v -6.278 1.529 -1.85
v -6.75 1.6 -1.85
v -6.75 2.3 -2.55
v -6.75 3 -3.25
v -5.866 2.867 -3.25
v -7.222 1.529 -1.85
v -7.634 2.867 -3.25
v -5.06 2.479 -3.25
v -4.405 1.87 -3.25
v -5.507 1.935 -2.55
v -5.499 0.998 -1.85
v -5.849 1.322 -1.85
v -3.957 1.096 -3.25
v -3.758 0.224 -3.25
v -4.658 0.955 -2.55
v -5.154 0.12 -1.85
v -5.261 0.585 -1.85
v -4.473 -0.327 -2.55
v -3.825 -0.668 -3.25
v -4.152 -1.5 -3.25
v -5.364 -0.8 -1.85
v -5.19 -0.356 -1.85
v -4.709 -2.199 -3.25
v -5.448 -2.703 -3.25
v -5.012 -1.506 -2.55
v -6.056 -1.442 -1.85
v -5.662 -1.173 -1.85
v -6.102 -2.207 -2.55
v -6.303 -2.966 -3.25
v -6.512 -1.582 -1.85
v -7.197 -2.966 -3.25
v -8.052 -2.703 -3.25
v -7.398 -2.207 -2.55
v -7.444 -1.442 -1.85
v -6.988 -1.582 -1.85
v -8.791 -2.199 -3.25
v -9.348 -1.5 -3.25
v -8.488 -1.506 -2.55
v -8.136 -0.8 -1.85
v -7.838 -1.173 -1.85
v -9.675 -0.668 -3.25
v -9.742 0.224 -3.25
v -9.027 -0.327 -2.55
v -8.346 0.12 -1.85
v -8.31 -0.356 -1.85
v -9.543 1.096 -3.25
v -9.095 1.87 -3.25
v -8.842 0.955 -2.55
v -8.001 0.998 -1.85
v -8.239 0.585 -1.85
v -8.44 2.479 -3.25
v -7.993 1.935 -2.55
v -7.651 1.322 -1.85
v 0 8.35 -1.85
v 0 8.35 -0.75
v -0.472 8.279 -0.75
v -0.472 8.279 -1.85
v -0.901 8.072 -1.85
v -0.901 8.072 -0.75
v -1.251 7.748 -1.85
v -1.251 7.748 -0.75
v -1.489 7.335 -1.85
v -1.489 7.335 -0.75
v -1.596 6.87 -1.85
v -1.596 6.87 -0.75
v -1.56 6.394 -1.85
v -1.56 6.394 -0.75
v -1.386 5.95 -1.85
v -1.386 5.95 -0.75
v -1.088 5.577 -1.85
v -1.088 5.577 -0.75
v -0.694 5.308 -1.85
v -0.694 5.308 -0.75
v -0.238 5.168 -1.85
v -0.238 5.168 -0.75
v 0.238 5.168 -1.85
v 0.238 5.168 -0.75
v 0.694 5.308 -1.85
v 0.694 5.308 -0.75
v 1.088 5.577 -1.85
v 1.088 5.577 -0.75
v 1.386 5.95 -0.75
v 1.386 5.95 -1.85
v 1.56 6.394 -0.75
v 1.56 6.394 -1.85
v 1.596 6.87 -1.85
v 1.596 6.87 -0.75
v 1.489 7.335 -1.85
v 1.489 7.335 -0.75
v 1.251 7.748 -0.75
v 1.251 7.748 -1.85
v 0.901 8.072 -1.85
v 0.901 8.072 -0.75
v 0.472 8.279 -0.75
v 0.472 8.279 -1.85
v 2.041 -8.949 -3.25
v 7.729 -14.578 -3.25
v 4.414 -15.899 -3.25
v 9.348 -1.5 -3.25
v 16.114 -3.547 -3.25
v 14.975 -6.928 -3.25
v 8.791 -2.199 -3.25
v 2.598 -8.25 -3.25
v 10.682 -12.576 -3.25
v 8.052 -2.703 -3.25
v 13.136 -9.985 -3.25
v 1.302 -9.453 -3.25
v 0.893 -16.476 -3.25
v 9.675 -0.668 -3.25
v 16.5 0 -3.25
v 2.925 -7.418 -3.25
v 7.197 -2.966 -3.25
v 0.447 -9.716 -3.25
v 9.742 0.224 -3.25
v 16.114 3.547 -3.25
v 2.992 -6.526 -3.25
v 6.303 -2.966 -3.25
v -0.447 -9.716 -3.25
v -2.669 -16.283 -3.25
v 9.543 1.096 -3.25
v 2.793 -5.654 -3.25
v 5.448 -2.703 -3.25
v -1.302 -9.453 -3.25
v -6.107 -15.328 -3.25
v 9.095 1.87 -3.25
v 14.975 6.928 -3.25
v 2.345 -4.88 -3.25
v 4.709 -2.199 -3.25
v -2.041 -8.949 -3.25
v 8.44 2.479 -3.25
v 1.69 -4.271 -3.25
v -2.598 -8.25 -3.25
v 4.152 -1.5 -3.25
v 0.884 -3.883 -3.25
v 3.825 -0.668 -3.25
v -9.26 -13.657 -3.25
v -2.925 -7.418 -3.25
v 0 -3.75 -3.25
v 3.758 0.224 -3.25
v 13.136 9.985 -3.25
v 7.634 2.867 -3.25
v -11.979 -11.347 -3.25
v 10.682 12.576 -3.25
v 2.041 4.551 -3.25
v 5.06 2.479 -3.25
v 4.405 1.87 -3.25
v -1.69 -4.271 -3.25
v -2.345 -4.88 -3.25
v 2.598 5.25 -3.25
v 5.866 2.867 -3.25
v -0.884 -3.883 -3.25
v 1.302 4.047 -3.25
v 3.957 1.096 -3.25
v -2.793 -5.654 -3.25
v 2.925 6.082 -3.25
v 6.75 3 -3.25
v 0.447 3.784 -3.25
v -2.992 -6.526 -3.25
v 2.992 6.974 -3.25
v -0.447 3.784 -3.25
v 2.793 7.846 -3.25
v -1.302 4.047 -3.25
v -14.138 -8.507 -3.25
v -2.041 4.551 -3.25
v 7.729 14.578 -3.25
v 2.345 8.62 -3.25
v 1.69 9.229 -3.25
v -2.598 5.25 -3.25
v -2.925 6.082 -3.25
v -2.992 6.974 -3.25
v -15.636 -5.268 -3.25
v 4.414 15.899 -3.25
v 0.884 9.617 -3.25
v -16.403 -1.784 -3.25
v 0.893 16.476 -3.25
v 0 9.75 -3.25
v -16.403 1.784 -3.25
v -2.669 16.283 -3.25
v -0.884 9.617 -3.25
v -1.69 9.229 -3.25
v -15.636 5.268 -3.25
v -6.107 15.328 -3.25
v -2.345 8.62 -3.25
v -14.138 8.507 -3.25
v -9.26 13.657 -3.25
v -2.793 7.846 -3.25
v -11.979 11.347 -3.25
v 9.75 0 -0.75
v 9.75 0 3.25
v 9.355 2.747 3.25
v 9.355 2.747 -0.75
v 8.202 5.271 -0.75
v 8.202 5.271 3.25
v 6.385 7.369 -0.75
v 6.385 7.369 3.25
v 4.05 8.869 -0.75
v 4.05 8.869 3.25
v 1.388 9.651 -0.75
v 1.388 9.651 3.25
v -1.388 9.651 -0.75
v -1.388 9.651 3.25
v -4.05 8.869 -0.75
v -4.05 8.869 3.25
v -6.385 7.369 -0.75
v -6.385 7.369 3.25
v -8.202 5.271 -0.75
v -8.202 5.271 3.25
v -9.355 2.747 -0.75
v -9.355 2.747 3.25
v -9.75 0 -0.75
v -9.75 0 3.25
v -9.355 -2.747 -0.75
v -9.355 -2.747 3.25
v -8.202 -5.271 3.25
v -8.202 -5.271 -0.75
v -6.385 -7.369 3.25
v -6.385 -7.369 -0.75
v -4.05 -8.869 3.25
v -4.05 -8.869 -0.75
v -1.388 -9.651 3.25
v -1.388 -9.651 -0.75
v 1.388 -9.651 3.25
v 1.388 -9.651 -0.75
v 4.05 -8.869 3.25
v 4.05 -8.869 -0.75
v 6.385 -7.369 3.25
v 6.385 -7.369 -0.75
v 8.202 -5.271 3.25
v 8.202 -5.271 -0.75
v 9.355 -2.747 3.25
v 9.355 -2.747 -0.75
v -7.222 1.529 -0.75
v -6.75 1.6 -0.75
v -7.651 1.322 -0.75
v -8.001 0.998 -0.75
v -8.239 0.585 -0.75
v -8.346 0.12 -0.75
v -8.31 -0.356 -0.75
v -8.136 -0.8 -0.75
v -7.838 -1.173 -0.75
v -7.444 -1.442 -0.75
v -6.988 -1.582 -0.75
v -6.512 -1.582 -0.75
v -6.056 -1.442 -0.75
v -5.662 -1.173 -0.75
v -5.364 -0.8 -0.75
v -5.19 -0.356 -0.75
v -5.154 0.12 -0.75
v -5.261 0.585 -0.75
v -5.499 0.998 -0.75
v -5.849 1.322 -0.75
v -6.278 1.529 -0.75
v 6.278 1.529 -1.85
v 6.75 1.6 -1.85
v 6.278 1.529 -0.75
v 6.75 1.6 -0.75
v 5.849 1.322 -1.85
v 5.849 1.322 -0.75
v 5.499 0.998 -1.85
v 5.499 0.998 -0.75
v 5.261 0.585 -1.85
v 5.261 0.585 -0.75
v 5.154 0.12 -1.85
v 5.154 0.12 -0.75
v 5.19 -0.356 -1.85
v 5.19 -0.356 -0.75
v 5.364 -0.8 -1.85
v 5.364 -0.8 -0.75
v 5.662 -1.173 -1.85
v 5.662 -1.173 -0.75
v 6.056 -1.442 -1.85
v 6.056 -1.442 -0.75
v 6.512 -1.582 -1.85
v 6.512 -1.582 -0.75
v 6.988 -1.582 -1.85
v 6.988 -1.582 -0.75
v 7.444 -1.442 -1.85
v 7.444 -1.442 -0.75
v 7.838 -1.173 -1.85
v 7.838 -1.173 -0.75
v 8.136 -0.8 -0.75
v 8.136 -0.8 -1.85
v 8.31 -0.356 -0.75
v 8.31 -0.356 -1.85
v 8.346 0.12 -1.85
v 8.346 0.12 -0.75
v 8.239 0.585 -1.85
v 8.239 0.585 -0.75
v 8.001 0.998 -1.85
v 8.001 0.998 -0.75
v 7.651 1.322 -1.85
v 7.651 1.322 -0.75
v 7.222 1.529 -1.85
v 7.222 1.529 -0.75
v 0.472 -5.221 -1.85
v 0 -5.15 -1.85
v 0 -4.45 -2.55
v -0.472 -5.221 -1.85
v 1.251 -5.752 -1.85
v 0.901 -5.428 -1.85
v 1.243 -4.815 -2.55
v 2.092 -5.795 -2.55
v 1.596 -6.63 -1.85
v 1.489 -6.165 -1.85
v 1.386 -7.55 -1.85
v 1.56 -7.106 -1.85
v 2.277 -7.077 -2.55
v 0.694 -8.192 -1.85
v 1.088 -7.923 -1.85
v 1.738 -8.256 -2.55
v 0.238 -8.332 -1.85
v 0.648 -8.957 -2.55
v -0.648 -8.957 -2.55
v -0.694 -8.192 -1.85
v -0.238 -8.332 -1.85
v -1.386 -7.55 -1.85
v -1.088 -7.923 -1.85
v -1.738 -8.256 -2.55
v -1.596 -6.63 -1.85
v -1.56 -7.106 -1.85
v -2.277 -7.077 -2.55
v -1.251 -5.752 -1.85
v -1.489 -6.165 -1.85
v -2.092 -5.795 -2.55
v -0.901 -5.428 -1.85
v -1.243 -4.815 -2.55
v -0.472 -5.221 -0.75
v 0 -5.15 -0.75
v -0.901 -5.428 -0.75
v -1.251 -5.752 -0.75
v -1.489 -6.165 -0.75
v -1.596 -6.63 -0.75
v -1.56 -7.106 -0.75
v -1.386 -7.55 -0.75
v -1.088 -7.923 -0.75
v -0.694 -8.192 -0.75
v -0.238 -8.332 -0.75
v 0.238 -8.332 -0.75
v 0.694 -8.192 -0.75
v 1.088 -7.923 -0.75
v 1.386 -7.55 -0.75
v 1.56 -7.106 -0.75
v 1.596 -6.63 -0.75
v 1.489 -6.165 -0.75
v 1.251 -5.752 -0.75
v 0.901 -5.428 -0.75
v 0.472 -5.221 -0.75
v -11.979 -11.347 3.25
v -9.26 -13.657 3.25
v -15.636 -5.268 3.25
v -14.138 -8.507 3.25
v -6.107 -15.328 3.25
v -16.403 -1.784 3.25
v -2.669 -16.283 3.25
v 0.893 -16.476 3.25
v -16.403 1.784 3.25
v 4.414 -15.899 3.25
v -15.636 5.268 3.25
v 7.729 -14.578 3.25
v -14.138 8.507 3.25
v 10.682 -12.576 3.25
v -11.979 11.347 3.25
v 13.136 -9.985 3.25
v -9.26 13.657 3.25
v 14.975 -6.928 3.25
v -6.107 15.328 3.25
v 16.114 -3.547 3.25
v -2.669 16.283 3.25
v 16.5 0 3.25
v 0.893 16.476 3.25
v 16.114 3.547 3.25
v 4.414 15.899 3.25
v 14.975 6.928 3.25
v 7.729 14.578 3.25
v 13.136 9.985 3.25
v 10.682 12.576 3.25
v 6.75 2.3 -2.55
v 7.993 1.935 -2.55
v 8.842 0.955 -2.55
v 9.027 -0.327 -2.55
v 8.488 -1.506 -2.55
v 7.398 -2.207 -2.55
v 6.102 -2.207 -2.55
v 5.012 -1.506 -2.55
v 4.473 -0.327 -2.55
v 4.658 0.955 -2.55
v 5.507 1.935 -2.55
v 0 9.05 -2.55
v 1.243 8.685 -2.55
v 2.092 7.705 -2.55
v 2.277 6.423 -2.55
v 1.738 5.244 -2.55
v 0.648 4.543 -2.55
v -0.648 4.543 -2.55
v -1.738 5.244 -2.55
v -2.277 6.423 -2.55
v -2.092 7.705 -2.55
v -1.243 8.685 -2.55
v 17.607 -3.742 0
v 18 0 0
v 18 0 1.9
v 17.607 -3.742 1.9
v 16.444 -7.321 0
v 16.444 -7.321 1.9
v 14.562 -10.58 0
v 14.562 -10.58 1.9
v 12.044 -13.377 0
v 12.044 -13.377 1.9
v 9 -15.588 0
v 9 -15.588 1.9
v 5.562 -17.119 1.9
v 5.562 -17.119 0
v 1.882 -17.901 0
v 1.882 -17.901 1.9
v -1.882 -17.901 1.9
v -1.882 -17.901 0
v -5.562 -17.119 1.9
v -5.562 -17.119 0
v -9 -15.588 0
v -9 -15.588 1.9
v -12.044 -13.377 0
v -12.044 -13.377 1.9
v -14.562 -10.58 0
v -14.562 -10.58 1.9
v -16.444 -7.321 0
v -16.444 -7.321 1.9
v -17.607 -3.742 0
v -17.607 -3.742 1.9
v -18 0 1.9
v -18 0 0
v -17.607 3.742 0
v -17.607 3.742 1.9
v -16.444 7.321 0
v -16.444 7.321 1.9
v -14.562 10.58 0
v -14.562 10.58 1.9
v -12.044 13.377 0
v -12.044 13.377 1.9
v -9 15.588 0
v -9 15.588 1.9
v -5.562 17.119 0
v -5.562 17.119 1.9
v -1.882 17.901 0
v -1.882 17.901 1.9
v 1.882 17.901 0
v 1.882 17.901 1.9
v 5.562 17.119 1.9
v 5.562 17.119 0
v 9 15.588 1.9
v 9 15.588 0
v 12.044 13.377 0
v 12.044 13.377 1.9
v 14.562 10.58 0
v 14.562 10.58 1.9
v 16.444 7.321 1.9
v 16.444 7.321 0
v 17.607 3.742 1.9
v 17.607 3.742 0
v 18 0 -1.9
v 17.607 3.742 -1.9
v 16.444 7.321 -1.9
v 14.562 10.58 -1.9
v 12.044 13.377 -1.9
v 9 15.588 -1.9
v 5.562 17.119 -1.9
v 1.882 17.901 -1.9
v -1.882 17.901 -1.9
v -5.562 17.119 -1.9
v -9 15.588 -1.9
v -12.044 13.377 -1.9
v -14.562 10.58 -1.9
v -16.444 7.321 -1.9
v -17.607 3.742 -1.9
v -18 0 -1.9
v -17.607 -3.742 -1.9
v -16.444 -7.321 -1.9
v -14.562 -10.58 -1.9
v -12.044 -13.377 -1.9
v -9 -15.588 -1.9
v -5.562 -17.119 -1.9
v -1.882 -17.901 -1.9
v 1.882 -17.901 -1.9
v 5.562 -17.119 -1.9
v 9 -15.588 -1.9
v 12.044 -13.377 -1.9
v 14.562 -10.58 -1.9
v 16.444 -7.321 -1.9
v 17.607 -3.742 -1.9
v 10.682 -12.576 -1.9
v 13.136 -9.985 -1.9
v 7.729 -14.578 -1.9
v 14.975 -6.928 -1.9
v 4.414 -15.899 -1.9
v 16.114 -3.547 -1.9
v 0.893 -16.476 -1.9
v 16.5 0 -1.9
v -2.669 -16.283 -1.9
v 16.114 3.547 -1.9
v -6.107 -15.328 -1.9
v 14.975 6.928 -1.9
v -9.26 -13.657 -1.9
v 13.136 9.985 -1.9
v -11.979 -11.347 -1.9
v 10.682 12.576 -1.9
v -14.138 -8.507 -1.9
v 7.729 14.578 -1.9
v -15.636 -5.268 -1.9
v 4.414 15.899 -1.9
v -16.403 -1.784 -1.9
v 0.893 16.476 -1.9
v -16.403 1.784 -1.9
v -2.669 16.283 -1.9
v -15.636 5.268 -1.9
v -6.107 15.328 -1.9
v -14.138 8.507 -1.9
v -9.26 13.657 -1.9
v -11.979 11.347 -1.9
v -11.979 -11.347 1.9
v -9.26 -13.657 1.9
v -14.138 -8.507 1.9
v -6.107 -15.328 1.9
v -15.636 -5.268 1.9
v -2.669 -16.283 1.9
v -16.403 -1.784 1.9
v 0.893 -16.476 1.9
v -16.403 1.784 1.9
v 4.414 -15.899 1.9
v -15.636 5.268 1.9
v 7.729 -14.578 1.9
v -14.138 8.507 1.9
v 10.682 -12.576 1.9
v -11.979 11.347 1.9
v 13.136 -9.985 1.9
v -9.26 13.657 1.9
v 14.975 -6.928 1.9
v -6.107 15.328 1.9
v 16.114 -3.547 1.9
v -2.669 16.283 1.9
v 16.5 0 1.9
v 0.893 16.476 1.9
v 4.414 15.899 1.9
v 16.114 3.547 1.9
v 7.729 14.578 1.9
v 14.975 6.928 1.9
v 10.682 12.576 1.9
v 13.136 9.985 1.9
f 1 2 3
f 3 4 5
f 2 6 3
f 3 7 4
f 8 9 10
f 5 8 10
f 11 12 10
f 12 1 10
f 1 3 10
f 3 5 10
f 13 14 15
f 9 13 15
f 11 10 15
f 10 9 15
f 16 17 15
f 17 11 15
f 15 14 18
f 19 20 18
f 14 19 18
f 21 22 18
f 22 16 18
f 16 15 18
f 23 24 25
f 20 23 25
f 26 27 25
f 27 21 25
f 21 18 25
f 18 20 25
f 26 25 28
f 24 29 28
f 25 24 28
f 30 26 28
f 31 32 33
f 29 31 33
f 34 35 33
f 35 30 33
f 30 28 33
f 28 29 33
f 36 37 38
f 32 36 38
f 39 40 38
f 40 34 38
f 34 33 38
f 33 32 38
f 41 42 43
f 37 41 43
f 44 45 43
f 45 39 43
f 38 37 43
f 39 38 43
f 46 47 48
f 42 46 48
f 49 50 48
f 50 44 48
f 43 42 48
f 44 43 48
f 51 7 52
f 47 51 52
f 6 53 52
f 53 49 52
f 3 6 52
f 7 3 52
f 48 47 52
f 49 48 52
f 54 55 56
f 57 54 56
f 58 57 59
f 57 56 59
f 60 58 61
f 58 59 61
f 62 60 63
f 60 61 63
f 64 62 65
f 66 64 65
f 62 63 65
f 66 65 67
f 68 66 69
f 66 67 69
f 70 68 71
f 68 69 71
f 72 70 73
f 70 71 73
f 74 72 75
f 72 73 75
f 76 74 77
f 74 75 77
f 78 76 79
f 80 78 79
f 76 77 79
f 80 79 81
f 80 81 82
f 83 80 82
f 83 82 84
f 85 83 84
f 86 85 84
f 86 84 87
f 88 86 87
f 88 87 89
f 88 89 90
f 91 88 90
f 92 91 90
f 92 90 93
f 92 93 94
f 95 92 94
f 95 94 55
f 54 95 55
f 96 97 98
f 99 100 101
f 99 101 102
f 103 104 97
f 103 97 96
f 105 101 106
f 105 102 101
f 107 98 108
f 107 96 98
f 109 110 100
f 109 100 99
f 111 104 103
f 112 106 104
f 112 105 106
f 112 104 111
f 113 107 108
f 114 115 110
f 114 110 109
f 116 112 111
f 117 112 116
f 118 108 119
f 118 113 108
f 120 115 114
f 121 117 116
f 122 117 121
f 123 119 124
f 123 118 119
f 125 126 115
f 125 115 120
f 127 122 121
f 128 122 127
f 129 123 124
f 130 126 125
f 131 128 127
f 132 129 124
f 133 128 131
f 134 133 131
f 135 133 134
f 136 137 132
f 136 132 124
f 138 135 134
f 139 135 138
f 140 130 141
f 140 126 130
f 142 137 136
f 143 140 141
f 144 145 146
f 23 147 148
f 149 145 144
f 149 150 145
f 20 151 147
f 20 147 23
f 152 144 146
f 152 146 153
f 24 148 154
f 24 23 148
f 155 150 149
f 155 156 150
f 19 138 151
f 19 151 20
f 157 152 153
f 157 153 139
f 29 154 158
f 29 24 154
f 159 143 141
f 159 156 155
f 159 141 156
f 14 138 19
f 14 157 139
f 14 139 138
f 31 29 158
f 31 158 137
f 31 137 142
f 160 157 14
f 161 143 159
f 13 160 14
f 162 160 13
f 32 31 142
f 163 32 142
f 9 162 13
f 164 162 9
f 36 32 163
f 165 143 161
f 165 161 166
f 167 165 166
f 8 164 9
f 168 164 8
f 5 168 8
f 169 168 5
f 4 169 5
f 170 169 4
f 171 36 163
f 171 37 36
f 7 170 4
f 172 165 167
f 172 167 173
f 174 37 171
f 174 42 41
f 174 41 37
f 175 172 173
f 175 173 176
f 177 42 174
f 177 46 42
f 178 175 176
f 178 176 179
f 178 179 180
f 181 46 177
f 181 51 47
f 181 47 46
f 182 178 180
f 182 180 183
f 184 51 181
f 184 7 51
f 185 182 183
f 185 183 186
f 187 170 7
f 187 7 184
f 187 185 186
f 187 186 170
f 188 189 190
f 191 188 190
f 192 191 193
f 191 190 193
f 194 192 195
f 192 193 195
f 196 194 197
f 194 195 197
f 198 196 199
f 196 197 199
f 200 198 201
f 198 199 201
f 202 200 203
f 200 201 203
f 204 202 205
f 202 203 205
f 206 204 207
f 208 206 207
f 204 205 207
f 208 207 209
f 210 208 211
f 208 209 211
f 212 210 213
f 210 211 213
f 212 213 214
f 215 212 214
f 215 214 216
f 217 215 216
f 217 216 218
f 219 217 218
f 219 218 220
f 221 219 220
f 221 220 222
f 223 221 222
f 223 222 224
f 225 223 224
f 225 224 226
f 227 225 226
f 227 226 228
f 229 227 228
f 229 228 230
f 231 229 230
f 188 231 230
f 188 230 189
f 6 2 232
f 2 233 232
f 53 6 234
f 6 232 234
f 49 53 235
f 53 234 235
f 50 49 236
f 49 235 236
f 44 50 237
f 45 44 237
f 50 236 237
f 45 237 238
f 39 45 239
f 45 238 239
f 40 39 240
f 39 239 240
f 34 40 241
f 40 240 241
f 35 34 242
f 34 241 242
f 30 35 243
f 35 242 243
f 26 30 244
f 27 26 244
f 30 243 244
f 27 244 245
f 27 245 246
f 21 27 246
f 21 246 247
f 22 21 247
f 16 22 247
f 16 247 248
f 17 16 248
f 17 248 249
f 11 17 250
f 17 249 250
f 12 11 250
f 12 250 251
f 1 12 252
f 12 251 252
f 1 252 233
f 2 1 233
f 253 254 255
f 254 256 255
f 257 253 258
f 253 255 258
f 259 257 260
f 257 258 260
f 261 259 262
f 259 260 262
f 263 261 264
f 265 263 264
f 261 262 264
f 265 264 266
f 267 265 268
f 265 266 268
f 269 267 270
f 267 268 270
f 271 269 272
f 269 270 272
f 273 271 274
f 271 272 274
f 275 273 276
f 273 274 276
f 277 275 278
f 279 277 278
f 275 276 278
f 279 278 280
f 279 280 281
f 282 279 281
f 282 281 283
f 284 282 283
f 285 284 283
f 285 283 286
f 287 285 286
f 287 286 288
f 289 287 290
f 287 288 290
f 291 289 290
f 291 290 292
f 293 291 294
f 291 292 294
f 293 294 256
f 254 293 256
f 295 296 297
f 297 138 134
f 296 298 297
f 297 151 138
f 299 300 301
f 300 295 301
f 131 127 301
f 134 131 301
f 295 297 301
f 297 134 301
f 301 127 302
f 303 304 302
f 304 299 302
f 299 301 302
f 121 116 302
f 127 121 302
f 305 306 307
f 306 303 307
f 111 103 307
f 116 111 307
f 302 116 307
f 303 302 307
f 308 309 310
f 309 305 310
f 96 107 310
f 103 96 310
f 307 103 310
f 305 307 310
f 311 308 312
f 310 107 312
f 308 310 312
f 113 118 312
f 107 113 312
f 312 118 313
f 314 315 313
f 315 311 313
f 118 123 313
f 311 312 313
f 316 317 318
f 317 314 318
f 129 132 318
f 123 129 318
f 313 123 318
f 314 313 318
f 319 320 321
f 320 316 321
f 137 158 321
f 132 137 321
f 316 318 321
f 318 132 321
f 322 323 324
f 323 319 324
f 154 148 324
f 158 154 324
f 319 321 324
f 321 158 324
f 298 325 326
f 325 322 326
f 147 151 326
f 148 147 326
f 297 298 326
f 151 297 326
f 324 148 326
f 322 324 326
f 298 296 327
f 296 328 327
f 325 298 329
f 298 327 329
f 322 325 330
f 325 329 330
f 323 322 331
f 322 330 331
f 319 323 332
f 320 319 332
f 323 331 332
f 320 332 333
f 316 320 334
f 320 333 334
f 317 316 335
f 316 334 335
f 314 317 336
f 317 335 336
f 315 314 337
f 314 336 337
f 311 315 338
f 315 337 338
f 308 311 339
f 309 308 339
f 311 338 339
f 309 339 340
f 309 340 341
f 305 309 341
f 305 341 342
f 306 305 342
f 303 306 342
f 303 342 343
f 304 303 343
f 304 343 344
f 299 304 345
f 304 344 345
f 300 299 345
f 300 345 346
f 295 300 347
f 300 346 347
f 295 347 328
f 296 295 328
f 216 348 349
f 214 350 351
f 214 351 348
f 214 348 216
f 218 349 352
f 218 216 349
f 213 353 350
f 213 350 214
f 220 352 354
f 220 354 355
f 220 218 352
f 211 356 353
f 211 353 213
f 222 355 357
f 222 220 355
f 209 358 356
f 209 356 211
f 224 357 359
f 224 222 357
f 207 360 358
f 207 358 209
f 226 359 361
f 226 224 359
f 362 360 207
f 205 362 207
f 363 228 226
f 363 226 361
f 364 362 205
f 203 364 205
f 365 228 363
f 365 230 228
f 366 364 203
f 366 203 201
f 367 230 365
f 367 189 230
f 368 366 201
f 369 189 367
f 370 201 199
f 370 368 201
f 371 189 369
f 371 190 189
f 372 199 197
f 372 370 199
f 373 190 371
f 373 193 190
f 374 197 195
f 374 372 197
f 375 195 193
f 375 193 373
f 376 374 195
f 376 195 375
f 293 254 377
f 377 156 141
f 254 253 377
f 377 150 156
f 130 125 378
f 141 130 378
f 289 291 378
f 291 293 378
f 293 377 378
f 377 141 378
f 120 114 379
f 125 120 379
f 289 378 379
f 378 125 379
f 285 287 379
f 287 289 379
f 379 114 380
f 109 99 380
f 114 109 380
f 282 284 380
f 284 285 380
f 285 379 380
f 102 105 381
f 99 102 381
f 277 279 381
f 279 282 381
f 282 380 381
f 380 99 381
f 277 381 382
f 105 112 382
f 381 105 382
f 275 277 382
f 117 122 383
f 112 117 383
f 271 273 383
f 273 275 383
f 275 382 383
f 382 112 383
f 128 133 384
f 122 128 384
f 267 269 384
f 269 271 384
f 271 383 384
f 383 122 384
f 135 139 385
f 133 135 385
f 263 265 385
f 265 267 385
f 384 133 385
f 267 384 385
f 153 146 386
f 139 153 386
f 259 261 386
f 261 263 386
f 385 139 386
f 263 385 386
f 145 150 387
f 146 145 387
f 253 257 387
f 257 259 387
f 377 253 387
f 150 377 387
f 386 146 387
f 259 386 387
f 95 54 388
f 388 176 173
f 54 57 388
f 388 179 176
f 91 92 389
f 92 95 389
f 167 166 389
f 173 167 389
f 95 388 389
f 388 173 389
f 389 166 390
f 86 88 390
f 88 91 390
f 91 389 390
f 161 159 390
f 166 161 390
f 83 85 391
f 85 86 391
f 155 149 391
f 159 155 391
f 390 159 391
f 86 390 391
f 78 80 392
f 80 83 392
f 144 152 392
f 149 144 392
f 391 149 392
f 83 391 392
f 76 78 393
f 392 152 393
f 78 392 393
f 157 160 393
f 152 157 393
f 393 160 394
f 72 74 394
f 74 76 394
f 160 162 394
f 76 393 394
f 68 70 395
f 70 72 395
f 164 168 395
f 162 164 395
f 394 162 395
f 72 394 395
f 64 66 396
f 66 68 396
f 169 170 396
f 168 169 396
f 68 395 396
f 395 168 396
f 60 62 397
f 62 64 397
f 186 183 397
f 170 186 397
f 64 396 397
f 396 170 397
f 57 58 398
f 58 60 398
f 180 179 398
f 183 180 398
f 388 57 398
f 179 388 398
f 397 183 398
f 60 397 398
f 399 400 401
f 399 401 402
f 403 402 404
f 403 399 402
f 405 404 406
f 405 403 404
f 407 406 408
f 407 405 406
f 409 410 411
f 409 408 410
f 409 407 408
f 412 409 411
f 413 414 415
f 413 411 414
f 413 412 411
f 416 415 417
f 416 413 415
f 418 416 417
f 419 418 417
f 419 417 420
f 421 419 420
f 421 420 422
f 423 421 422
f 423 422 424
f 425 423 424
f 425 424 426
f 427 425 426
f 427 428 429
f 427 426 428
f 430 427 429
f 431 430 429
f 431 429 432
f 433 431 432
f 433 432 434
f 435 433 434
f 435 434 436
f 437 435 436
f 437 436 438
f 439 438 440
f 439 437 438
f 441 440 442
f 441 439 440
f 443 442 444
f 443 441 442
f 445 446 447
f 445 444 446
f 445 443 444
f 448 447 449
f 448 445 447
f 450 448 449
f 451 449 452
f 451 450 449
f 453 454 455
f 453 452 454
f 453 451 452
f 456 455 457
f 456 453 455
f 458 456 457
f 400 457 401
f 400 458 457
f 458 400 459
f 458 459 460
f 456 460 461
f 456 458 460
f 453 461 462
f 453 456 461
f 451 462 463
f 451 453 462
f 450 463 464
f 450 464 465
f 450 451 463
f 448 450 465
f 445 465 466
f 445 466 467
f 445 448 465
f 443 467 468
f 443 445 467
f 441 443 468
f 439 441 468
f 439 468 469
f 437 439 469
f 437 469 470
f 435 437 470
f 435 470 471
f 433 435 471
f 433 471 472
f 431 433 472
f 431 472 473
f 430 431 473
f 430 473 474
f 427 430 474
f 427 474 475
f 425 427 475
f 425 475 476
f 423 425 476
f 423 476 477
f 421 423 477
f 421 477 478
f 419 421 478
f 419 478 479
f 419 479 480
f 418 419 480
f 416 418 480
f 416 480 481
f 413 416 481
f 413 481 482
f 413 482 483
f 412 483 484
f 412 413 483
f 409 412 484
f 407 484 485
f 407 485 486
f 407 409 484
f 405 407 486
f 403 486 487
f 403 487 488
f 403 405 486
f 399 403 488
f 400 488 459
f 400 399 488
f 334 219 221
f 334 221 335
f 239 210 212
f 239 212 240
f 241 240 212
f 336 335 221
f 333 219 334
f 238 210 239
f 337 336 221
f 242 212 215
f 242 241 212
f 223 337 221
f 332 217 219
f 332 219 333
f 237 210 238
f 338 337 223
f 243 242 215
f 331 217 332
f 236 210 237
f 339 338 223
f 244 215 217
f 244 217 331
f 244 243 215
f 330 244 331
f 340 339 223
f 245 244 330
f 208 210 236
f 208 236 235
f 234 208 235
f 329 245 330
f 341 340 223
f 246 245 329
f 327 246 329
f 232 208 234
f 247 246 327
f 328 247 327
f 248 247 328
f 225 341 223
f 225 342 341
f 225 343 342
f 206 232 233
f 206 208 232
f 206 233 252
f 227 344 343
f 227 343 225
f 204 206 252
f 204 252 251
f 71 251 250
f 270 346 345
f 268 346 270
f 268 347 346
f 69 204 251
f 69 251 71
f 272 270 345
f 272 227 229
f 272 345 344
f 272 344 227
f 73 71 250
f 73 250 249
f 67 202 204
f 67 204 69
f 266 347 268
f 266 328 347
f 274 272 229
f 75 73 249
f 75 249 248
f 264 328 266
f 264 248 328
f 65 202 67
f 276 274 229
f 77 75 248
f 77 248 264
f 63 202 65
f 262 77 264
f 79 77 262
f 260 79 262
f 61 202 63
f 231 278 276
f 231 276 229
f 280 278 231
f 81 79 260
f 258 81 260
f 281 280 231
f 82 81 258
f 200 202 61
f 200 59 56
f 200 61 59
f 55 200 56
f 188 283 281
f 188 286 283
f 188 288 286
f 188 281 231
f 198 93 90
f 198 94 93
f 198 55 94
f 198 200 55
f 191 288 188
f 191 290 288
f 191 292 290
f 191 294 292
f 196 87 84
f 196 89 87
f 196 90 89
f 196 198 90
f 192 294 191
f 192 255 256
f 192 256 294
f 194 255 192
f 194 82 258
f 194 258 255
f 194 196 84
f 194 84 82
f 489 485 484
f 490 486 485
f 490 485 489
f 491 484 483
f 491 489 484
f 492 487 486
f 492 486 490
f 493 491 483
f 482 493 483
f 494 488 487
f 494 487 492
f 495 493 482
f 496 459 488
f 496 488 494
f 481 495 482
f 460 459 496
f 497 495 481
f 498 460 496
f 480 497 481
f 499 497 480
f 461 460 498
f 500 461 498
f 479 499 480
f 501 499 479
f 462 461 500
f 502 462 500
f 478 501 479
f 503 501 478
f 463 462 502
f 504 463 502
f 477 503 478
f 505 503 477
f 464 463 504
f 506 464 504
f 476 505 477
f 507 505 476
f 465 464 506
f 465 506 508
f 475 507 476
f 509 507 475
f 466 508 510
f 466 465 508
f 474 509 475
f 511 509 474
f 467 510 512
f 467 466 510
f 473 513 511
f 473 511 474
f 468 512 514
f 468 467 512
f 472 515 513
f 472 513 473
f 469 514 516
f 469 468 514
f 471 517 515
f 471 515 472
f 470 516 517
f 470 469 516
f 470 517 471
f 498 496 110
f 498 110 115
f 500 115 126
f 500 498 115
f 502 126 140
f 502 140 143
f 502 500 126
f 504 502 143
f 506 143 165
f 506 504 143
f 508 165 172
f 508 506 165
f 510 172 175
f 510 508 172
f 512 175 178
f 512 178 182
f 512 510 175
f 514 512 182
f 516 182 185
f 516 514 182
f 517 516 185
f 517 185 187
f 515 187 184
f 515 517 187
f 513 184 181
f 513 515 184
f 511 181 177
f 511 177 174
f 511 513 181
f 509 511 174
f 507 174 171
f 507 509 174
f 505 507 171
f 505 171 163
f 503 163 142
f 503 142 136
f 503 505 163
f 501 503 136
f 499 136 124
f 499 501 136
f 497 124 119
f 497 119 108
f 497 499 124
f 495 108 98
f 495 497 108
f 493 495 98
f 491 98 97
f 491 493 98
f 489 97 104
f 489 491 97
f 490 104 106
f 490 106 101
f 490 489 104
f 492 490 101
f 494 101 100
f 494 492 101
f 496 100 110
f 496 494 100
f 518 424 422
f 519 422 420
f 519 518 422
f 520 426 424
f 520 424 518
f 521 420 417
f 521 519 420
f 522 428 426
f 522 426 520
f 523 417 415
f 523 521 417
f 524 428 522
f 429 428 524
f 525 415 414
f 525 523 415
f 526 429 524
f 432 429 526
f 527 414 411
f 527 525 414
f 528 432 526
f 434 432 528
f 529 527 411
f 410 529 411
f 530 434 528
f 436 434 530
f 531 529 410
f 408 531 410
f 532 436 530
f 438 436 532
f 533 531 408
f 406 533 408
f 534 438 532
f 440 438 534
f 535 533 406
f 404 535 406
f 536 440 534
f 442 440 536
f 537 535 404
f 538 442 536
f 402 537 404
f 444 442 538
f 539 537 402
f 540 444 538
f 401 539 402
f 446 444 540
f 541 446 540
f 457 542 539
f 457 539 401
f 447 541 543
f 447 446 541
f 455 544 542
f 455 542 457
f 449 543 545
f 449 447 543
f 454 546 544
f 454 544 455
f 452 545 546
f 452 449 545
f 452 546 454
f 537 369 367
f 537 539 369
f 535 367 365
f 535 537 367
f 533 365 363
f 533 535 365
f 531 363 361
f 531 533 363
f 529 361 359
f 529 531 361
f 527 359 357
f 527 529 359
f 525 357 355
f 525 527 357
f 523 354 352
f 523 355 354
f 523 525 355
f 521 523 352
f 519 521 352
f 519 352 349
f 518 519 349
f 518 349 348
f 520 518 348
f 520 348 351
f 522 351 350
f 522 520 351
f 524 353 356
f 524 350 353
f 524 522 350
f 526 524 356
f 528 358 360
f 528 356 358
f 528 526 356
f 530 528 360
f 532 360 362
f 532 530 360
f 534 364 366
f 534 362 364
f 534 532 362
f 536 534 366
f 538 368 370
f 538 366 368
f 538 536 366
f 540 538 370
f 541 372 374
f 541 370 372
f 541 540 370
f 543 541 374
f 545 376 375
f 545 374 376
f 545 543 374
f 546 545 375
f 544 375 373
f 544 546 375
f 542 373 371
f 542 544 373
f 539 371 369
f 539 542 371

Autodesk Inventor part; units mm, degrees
ref_plane "YZ Plane" through (0, 0, 0) normal (1, 0, 0) x (0, 1, 0)
ref_plane "XZ Plane" through (0, 0, 0) normal (0, 1, 0) x (-1, 0, 0)
ref_plane "XY Plane" through (0, 0, 0) normal (0, 0, 1) x (1, 0, 0)
sketch "Эскиз6" plane through (0, 0, 0) normal (0, 0, 1) x (1, 0, 0)
  circle A0 centre (0, 0) radius 18
  dimension "d27" = 36
extrude "Выдавливание5" add sketch "Эскиз6" along normal blind 1.9
sketch "Эскиз7" plane through (0, 0, 1.9) normal (0, 0, 1) x (1, 0, 0)
  circle A0 centre (0, 0) radius 16.5
  dimension "d30" = 33
extrude "Выдавливание6" add sketch "Эскиз7" along normal blind 1.35
mirror "Зеркальное отражение1" about plane through (0, 0, 0) normal (0, 0, -1)
sketch "Эскиз8" plane through (0, 0, 3.25) normal (0, 0, 1) x (1, 0, 0)
  circle A0 centre (0, 0) radius 9.75
  dimension "d33" = 19.5
extrude "Выдавливание7" cut sketch "Эскиз8" against normal blind 4
sketch "Эскиз9" plane through (0, 0, -3.25) normal (0, 0, -1) x (-1, 0, 0)
  circle A0 centre (0, 0) radius 9.75 projected
  circle A1 centre (0, 0) radius 6.75 construction
  line L0 (0, -6.75) -> (0, 6.75) construction
  line L1 (-6.75, 0) -> (6.75, 0) construction
  dimension "d44" = 13.5
hole "Отверстие2" at (0, 6.75, -3.25) at (6.75, 0, -3.25) at (-6.75, 0, -3.25) at (0, -6.75, -3.25) direction (0, 0, 1) diameter 3.2 end through all countersink diameter 6 countersink angle 90
properties part number "Колесо D40 под планшайбу"
